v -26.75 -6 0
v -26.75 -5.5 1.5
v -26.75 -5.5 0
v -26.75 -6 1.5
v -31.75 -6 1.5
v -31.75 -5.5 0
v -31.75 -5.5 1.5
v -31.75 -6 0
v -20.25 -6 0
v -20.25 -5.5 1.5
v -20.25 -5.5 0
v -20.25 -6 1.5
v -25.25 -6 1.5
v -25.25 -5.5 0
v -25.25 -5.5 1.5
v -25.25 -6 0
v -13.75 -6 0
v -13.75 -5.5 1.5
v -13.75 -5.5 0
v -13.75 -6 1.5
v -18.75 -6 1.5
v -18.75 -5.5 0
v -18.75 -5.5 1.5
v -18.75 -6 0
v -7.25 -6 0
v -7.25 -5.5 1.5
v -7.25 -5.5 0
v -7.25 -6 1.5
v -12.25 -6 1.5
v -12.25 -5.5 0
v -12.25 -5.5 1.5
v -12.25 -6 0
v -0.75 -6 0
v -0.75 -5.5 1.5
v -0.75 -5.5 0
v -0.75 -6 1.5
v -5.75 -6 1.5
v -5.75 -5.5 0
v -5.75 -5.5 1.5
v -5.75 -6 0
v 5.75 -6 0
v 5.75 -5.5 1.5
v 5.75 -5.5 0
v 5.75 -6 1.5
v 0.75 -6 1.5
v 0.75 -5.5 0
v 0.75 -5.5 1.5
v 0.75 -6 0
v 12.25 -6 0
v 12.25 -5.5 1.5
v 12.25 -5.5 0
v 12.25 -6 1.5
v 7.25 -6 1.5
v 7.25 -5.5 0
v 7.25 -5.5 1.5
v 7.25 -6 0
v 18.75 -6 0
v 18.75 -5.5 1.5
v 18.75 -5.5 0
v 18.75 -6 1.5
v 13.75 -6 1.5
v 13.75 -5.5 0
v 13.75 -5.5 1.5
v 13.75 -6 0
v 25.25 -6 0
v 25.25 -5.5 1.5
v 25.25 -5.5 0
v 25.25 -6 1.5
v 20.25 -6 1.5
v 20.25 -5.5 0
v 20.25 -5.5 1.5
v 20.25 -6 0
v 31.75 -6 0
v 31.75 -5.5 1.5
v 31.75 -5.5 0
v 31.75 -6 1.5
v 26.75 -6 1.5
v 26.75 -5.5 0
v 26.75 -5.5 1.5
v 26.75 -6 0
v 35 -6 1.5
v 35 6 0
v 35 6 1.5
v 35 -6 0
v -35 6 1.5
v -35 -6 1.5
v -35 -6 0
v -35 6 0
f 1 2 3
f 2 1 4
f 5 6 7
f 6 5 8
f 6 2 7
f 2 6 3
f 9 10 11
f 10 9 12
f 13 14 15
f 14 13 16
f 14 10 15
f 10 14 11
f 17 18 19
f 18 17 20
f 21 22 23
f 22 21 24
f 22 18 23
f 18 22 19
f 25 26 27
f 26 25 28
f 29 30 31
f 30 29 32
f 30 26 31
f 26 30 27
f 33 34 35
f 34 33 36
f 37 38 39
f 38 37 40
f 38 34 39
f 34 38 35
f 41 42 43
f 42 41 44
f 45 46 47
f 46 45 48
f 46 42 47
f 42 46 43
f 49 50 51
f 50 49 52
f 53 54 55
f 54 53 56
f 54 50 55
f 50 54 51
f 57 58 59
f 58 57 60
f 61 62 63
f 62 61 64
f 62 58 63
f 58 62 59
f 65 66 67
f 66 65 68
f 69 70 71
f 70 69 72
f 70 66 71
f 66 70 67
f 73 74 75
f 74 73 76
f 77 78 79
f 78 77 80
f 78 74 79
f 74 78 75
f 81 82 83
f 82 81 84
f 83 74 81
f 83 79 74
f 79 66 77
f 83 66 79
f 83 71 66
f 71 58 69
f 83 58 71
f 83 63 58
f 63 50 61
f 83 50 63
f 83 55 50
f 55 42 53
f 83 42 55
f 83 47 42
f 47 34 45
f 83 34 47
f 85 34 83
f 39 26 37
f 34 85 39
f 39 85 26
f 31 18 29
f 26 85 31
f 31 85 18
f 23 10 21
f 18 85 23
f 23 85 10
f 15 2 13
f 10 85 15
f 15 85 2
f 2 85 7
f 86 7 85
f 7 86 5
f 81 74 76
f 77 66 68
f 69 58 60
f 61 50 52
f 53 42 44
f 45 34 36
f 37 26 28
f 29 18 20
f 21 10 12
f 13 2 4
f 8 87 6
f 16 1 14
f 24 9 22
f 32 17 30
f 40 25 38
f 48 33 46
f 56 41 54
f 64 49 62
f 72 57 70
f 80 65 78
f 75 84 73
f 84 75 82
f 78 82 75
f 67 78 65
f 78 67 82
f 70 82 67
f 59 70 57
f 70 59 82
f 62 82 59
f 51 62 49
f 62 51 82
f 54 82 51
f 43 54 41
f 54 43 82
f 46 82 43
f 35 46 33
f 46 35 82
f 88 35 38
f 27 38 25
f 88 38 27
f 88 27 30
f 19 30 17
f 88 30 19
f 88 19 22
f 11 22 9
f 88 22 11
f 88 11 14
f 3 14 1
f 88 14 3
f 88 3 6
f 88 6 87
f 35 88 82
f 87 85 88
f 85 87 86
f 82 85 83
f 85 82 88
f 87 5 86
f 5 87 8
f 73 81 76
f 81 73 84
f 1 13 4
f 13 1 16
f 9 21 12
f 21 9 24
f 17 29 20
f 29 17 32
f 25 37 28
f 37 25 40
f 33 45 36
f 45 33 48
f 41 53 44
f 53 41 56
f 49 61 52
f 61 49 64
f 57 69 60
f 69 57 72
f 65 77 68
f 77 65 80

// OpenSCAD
// 10-well agarose gel comb, printed lying flat
// Units: mm

// ---------- Parameters ----------
plate_t      = 1.5;    // comb plate thickness (Z)
spine_len    = 70;     // spine (back bar) length (X)
spine_w      = 12;     // spine width (Y)
tooth_count  = 10;     // number of teeth
tooth_w      = 5.0;    // tooth width (X)
tooth_len    = 12;     // tooth length from spine edge (Y)
tooth_gap    = 1.5;    // gap between neighbouring teeth (X)
eps          = 0.5;    // cutter overshoot past faces (Z)

$fn = 64;

// ---------- Derived ----------
pitch   = tooth_w + tooth_gap;            // centre-to-centre tooth spacing
x_start = -(tooth_count - 1) * pitch / 2; // first tooth centre X (row centred)

// ---------- Model ----------
difference() {
    // Base plate
    translate([-spine_len / 2, -spine_w / 2, 0])
        cube([spine_len, spine_w, plate_t]);

    // Teeth cut out from the -Y edge of the spine
    for (i = [0 : tooth_count - 1])
        translate([x_start + i * pitch - tooth_w / 2,
                   -spine_w / 2 - tooth_len,
                   -eps])
            cube([tooth_w, tooth_len + eps, plate_t + 2 * eps]);
}
